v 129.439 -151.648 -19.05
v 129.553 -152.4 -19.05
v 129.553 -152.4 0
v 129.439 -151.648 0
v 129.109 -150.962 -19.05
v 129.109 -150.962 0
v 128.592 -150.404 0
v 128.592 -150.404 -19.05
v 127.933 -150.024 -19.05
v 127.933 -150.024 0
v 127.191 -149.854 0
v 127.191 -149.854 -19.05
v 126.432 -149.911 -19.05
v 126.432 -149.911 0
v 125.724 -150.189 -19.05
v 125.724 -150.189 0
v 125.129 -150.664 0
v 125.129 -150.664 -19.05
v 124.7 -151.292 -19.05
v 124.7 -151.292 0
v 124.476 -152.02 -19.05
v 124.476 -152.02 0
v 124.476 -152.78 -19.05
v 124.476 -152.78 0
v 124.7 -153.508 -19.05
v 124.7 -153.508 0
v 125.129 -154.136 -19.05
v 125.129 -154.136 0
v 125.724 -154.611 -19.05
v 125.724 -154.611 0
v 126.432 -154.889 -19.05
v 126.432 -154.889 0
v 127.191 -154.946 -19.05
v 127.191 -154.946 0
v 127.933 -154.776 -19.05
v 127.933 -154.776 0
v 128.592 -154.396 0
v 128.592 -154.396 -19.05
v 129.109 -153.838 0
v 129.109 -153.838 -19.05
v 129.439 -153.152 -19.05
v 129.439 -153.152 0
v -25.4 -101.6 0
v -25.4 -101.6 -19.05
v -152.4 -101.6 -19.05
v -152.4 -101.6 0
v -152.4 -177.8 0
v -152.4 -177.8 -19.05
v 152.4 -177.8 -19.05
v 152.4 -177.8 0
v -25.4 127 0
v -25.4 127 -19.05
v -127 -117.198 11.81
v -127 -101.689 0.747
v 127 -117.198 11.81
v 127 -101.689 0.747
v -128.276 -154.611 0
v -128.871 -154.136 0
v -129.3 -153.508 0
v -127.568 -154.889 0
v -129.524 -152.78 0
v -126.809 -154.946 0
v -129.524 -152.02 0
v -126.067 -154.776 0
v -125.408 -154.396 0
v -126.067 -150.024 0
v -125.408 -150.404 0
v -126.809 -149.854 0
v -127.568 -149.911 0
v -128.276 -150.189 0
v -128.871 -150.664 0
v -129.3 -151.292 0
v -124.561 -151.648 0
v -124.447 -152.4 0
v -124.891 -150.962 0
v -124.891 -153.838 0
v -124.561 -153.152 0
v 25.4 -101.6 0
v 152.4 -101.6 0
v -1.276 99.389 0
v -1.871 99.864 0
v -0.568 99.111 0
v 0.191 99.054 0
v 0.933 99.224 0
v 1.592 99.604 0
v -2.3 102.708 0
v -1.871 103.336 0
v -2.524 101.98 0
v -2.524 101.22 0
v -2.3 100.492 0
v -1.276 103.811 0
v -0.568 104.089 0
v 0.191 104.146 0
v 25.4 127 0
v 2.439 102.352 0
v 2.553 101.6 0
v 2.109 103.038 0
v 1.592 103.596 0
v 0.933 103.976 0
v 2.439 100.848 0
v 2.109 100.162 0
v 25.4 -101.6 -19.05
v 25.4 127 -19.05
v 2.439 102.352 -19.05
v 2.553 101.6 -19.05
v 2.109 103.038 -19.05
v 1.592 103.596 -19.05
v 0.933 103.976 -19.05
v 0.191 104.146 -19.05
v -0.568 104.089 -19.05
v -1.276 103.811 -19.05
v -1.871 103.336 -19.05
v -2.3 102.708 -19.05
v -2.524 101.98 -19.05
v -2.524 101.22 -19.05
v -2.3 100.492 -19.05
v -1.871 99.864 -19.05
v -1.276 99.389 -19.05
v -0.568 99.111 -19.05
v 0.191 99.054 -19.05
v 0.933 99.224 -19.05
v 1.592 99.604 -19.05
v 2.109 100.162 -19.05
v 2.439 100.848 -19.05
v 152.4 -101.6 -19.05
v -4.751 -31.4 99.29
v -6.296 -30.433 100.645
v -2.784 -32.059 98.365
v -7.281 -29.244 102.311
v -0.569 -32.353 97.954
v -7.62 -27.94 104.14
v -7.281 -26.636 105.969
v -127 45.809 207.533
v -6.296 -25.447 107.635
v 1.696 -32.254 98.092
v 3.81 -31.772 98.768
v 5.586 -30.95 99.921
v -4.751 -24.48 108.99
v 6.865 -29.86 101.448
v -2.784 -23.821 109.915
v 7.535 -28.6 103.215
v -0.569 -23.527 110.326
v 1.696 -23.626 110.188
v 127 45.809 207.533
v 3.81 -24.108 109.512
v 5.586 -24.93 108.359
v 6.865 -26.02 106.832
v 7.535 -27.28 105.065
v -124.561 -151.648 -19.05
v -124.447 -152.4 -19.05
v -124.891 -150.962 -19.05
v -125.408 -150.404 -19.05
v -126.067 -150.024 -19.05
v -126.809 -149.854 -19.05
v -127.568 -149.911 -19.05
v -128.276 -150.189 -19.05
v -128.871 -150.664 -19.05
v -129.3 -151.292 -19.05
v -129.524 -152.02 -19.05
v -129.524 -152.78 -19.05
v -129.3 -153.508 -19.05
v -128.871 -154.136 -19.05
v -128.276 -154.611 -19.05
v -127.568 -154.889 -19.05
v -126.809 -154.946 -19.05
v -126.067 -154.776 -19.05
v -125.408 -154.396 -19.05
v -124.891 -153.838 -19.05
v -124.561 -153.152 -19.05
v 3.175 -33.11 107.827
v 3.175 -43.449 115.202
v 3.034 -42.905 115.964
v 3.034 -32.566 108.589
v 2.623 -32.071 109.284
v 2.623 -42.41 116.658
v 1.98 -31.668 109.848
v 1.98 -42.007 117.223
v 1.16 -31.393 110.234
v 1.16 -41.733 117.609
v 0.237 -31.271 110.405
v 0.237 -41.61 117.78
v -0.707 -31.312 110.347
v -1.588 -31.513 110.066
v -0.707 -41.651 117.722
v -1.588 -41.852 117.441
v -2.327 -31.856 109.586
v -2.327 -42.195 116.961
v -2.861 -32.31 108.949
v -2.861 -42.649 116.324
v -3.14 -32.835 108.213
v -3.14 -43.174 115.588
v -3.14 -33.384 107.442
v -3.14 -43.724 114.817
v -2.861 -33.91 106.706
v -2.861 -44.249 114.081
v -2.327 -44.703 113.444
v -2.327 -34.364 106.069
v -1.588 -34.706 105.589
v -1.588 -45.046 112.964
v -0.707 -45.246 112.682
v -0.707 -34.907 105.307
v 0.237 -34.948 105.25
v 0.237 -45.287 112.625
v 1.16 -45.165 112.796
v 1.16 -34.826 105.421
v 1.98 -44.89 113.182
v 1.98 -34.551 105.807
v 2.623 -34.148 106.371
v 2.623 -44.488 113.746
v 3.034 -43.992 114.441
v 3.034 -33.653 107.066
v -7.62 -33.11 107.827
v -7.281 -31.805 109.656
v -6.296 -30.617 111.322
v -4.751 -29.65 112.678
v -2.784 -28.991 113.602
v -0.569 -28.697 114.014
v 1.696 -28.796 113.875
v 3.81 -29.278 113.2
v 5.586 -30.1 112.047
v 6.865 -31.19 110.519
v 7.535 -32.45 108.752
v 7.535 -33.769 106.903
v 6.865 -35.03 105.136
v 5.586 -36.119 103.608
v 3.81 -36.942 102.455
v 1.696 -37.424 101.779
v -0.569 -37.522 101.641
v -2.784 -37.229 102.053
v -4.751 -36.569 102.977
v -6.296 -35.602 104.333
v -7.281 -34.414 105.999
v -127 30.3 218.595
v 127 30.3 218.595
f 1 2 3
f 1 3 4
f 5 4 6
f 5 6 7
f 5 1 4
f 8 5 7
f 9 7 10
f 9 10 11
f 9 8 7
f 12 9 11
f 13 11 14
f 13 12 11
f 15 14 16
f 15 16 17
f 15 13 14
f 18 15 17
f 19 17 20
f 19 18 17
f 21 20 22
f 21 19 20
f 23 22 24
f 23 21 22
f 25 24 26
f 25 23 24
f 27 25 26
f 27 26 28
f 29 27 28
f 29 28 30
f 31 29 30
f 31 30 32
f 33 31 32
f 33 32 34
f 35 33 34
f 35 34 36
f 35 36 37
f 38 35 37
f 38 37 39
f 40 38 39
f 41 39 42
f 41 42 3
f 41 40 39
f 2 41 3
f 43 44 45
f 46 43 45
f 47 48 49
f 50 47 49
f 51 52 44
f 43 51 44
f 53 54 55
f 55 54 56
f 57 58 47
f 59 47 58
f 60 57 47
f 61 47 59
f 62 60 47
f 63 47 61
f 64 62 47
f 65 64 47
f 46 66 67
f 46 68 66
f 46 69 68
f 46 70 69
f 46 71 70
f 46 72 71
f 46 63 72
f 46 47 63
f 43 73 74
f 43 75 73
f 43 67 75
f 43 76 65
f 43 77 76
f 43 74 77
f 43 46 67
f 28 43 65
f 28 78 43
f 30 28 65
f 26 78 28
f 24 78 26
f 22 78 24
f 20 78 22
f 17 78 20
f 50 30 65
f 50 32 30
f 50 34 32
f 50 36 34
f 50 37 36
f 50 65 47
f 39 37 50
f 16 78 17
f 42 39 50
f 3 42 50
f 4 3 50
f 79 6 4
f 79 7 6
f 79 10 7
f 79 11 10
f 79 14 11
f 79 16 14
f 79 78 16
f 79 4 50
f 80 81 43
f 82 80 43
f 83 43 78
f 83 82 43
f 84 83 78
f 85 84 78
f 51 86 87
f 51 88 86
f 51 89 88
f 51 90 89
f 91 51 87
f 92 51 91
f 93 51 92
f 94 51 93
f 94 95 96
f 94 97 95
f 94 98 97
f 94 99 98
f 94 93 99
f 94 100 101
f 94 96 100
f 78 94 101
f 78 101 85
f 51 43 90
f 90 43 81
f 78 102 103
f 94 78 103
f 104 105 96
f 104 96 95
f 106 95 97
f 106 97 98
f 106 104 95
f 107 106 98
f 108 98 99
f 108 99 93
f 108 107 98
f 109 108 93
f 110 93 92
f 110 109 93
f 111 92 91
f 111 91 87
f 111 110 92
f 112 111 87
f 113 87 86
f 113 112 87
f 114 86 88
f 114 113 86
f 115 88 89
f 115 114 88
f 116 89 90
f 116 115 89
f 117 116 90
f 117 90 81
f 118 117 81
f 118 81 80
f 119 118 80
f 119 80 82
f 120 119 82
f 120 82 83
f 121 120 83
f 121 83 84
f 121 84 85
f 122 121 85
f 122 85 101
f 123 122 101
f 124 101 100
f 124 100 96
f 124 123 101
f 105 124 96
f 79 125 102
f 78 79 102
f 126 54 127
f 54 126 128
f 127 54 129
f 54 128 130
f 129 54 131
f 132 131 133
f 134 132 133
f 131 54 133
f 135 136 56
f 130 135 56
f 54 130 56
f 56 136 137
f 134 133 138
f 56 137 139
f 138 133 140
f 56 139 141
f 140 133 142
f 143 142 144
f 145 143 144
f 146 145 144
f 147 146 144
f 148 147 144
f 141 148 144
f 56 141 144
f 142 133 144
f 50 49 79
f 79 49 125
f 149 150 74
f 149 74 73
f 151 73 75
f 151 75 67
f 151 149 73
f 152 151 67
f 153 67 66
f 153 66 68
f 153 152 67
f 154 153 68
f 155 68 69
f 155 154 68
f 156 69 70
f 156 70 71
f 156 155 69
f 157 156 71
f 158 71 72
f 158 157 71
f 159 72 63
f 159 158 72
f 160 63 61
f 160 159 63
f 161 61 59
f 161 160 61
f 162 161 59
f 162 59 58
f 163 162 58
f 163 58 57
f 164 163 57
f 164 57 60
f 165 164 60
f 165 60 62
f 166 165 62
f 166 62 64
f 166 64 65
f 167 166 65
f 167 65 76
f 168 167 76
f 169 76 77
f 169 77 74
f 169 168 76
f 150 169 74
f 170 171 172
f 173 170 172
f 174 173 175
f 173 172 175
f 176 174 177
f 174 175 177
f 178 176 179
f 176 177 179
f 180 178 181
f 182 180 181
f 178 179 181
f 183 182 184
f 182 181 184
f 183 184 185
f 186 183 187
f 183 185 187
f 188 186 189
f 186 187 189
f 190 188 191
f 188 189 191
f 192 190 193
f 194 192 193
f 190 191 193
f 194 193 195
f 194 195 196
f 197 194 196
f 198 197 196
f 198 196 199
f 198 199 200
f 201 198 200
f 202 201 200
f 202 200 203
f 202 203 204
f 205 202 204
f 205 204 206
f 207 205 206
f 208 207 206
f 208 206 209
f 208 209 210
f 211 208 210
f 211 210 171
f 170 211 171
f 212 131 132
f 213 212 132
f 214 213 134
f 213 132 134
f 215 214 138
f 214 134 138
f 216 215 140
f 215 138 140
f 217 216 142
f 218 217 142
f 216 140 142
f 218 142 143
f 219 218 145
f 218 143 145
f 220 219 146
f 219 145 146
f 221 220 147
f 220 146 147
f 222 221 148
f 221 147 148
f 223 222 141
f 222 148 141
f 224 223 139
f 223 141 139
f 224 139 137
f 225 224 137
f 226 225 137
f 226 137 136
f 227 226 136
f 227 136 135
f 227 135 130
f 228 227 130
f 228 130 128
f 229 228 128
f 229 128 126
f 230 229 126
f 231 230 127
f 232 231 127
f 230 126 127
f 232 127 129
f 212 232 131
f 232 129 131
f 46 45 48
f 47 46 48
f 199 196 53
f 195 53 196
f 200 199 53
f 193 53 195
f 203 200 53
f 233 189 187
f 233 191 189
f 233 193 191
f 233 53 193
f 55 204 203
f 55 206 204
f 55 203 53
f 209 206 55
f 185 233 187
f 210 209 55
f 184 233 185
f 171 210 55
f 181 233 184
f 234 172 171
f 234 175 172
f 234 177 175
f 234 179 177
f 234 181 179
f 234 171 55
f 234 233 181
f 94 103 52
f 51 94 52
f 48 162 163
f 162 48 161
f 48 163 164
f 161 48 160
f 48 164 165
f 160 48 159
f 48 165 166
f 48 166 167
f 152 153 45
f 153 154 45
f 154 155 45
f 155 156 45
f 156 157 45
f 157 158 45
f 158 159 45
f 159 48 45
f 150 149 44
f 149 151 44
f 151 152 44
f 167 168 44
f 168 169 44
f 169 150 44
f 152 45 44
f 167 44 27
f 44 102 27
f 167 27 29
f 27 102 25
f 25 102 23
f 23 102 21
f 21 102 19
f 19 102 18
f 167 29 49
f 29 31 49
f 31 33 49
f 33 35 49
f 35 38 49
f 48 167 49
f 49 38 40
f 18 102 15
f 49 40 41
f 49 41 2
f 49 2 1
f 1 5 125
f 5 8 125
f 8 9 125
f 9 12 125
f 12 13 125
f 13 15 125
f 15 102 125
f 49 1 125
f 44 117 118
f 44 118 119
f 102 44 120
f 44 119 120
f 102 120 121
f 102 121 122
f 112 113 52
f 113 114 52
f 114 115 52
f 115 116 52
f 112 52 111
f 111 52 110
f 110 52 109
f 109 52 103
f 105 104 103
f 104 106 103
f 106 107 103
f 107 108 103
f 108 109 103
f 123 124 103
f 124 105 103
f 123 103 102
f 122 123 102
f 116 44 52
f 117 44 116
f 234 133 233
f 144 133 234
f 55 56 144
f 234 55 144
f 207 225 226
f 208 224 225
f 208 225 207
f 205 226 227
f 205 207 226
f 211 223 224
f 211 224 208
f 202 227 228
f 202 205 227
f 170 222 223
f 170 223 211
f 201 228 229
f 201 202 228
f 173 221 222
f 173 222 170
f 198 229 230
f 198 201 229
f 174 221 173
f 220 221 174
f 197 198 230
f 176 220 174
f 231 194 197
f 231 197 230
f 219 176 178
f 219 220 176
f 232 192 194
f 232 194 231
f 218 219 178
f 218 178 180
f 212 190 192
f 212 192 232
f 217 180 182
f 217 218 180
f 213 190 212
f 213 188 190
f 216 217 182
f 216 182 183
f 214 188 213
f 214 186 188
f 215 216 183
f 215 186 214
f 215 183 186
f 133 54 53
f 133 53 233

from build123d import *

# Parameters (mm, degrees)
SKETCH_W        = 254
SKETCH_H        = 254
PAD_DEPTH       = 19.05
SKETCH003_R     = 3.175
POCKET_DEPTH    = 139.1318591011
SKETCH004_R     = 7.62
POCKET001_DEPTH = 6.35
SKETCH002_R     = 2.5527
PAD001_DEPTH    = 19.05


with BuildPart() as bodyplatform:
    # Sketch → Pad (new body)
    with BuildSketch(Plane(origin=(0, -27.94, 104.14), x_dir=(1, 0, 0), z_dir=(0, -0.8141155184, 0.5807029557))):
        Rectangle(SKETCH_W, SKETCH_H)
    extrude(amount=PAD_DEPTH)

    # Sketch003 (on Face6 of Pad) → Pocket (cut, through all)
    with BuildSketch(Plane(origin=(0, -83.2602399739, 59.3889520048), x_dir=(1, 0, 0), z_dir=(0, -0.8141155184, 0.5807029557))):
        with Locations((0, 68.5571494991)):
            Circle(SKETCH003_R)
    extrude(amount=-POCKET_DEPTH, mode=Mode.SUBTRACT)

    # Sketch004 (on Face4 of Pocket) → Pocket001 (cut)
    with BuildSketch(Plane(origin=(0, -67.7513393492, 48.3265606985), x_dir=(-1, 0, 0), z_dir=(0, 0.8141155184, -0.5807029557))):
        with Locations((0, 68.5571494991)):
            Circle(SKETCH004_R)
    extrude(amount=-POCKET001_DEPTH, mode=Mode.SUBTRACT)


with BuildPart() as bodyfeet:
    # Sketch002 → Pad001 (new body)
    with BuildSketch(Plane.XY.offset(-19.05)):
        Polygon((-152.4, -177.8), (152.4, -177.8), (152.4, -101.6), (25.4, -101.6), (25.4, 127), (-25.4, 127), (-25.4, -101.6), (-152.4, -101.6), align=None)
        with Locations((-127, -152.4)):
            Circle(SKETCH002_R, mode=Mode.SUBTRACT)
        with Locations((127, -152.4)):
            Circle(SKETCH002_R, mode=Mode.SUBTRACT)
        with Locations((0, 101.6)):
            Circle(SKETCH002_R, mode=Mode.SUBTRACT)
    extrude(amount=PAD001_DEPTH)


solid = Compound([bodyplatform.part, bodyfeet.part])
